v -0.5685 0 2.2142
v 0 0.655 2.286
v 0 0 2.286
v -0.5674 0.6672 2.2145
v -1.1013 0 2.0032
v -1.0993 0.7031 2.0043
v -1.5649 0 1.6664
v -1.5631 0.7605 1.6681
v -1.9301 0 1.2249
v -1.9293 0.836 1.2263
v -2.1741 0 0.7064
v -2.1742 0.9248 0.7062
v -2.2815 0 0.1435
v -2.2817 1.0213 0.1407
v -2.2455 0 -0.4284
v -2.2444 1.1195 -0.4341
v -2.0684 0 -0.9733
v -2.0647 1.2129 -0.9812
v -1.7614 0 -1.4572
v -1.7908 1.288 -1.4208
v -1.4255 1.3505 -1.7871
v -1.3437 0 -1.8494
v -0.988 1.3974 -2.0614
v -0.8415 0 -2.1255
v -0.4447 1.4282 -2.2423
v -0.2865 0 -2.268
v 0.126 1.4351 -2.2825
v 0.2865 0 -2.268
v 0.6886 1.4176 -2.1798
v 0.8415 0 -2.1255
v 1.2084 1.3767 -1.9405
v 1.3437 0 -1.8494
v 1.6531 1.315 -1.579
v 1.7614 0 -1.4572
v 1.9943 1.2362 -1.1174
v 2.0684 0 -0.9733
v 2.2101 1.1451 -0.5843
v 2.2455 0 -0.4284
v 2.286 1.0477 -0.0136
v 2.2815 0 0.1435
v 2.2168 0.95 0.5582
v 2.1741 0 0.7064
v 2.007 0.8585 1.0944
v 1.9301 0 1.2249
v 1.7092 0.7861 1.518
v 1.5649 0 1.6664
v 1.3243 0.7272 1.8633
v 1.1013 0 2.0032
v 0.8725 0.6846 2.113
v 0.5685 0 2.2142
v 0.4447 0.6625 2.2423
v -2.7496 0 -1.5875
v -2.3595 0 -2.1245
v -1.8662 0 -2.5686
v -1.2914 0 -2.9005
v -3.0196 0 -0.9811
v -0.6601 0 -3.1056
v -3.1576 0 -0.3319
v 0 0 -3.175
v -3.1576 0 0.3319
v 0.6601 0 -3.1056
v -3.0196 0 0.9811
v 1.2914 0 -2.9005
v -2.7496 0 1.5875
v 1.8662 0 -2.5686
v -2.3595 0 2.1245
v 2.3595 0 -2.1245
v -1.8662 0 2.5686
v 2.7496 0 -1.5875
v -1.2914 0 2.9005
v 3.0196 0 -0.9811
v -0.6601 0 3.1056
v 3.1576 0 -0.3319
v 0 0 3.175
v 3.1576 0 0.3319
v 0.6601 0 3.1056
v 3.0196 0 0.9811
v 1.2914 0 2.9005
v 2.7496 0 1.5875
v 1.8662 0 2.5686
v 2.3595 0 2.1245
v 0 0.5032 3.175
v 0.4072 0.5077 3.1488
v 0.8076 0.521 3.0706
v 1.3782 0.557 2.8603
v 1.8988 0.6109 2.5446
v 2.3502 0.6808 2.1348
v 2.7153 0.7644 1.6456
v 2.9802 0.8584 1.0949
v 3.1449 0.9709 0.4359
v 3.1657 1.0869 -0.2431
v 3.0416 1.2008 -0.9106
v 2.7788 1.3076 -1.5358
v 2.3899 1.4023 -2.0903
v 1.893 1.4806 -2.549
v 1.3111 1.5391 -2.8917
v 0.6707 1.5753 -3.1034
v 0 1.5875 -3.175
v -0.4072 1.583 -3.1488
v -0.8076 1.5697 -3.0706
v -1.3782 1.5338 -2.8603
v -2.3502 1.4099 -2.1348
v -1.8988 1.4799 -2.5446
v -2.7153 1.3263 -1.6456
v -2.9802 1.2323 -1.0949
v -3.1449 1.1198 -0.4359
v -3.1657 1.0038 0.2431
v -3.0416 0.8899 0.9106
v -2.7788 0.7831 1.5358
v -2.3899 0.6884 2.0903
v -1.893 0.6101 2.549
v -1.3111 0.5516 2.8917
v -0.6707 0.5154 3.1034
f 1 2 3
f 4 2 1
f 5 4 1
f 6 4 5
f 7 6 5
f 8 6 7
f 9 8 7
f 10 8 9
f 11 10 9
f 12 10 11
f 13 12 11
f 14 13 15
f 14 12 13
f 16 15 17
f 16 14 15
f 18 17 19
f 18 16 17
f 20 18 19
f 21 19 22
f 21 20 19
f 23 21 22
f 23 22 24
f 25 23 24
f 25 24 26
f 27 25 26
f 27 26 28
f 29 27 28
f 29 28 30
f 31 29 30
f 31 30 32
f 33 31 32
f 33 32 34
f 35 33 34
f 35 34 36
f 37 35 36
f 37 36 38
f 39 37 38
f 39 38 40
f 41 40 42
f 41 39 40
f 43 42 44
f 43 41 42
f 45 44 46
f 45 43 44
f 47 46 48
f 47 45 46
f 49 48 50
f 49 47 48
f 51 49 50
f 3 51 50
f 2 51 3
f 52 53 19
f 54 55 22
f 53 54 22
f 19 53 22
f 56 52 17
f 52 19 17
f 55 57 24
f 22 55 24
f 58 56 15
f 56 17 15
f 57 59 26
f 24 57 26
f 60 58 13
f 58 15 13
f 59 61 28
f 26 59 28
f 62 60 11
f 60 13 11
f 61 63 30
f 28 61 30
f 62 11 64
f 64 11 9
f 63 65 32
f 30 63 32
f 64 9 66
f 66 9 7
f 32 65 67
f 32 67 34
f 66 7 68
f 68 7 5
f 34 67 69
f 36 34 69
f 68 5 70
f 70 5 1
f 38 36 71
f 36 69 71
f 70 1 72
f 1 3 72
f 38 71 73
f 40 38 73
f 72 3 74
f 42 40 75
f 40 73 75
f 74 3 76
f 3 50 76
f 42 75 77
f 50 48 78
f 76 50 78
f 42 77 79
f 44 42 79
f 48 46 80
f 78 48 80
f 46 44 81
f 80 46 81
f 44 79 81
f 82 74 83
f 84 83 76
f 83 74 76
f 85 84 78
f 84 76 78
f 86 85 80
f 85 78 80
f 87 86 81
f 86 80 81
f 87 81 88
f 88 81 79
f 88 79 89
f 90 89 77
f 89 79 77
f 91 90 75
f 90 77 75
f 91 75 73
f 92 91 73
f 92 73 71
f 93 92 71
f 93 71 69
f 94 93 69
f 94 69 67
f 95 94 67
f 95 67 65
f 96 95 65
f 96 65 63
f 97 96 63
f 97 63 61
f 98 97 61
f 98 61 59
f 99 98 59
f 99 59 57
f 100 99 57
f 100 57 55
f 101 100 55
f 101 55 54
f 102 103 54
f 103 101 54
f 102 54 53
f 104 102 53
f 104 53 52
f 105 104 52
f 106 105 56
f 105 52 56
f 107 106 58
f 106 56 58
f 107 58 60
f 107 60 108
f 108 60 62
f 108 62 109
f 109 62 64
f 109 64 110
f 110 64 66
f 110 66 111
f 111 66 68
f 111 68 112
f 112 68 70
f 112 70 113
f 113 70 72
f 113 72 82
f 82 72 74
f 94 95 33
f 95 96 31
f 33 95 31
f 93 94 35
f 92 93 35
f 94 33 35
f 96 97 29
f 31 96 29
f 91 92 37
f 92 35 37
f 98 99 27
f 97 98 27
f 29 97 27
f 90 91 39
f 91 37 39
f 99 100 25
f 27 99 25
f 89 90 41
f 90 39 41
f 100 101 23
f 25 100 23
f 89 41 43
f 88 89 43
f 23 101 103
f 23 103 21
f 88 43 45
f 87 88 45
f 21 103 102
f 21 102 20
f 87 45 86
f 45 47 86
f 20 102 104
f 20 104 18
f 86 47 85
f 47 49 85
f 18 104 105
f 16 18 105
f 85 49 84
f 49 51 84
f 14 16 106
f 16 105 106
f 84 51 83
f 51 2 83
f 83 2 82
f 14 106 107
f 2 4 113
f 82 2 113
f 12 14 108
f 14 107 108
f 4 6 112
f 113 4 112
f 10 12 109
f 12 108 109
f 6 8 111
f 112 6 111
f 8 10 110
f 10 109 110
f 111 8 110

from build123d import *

# Parameters (mm, degrees)
SKETCH1_R               = 3.175
BOSS_EXTRUDE1_DEPTH     = 1.5875
CUT_EXTRUDE2_DEPTH      = 5.7625
CUT_EXTRUDE2_DEPTH_BACK = 5.7625
CUT_EXTRUDE3_DEPTH      = 5.7625
CUT_EXTRUDE3_DEPTH_BACK = 5.7625
SKETCH3_R               = 2.286


with BuildPart() as part:
    # Sketch1 → Boss-Extrude1 (new body)
    with BuildSketch(Plane(origin=(0, 0, 0), x_dir=(1, 0, 0), z_dir=(0, 1, 0))):
        with Locations(Location((0, 0, 0), (0, 0, 270))):
            Circle(SKETCH1_R)
    extrude(amount=BOSS_EXTRUDE1_DEPTH)

    # Sketch2 → Cut-Extrude2 (cut, two sides: drawn at the far end of the back side and taken through both)
    with BuildSketch(Plane(origin=(0, 0, 0), x_dir=(0, 0, -1), z_dir=(1, 0, 0)).offset(-CUT_EXTRUDE2_DEPTH_BACK)):
        Polygon((3.175, 1.5875), (-3.175, 0.503215254), (-3.175, 1.5875), align=None)
    extrude(amount=CUT_EXTRUDE2_DEPTH + CUT_EXTRUDE2_DEPTH_BACK, mode=Mode.SUBTRACT)

    # Sketch3 → Cut-Extrude3 (cut, two sides: drawn at the far end of the back side and taken through both)
    with BuildSketch(Plane.XZ.offset(-CUT_EXTRUDE3_DEPTH_BACK)):
        with Locations(Location((0, 0, 0), (0, 0, 90))):
            Circle(SKETCH3_R)
    extrude(amount=CUT_EXTRUDE3_DEPTH + CUT_EXTRUDE3_DEPTH_BACK, mode=Mode.SUBTRACT)


solid = part.part
